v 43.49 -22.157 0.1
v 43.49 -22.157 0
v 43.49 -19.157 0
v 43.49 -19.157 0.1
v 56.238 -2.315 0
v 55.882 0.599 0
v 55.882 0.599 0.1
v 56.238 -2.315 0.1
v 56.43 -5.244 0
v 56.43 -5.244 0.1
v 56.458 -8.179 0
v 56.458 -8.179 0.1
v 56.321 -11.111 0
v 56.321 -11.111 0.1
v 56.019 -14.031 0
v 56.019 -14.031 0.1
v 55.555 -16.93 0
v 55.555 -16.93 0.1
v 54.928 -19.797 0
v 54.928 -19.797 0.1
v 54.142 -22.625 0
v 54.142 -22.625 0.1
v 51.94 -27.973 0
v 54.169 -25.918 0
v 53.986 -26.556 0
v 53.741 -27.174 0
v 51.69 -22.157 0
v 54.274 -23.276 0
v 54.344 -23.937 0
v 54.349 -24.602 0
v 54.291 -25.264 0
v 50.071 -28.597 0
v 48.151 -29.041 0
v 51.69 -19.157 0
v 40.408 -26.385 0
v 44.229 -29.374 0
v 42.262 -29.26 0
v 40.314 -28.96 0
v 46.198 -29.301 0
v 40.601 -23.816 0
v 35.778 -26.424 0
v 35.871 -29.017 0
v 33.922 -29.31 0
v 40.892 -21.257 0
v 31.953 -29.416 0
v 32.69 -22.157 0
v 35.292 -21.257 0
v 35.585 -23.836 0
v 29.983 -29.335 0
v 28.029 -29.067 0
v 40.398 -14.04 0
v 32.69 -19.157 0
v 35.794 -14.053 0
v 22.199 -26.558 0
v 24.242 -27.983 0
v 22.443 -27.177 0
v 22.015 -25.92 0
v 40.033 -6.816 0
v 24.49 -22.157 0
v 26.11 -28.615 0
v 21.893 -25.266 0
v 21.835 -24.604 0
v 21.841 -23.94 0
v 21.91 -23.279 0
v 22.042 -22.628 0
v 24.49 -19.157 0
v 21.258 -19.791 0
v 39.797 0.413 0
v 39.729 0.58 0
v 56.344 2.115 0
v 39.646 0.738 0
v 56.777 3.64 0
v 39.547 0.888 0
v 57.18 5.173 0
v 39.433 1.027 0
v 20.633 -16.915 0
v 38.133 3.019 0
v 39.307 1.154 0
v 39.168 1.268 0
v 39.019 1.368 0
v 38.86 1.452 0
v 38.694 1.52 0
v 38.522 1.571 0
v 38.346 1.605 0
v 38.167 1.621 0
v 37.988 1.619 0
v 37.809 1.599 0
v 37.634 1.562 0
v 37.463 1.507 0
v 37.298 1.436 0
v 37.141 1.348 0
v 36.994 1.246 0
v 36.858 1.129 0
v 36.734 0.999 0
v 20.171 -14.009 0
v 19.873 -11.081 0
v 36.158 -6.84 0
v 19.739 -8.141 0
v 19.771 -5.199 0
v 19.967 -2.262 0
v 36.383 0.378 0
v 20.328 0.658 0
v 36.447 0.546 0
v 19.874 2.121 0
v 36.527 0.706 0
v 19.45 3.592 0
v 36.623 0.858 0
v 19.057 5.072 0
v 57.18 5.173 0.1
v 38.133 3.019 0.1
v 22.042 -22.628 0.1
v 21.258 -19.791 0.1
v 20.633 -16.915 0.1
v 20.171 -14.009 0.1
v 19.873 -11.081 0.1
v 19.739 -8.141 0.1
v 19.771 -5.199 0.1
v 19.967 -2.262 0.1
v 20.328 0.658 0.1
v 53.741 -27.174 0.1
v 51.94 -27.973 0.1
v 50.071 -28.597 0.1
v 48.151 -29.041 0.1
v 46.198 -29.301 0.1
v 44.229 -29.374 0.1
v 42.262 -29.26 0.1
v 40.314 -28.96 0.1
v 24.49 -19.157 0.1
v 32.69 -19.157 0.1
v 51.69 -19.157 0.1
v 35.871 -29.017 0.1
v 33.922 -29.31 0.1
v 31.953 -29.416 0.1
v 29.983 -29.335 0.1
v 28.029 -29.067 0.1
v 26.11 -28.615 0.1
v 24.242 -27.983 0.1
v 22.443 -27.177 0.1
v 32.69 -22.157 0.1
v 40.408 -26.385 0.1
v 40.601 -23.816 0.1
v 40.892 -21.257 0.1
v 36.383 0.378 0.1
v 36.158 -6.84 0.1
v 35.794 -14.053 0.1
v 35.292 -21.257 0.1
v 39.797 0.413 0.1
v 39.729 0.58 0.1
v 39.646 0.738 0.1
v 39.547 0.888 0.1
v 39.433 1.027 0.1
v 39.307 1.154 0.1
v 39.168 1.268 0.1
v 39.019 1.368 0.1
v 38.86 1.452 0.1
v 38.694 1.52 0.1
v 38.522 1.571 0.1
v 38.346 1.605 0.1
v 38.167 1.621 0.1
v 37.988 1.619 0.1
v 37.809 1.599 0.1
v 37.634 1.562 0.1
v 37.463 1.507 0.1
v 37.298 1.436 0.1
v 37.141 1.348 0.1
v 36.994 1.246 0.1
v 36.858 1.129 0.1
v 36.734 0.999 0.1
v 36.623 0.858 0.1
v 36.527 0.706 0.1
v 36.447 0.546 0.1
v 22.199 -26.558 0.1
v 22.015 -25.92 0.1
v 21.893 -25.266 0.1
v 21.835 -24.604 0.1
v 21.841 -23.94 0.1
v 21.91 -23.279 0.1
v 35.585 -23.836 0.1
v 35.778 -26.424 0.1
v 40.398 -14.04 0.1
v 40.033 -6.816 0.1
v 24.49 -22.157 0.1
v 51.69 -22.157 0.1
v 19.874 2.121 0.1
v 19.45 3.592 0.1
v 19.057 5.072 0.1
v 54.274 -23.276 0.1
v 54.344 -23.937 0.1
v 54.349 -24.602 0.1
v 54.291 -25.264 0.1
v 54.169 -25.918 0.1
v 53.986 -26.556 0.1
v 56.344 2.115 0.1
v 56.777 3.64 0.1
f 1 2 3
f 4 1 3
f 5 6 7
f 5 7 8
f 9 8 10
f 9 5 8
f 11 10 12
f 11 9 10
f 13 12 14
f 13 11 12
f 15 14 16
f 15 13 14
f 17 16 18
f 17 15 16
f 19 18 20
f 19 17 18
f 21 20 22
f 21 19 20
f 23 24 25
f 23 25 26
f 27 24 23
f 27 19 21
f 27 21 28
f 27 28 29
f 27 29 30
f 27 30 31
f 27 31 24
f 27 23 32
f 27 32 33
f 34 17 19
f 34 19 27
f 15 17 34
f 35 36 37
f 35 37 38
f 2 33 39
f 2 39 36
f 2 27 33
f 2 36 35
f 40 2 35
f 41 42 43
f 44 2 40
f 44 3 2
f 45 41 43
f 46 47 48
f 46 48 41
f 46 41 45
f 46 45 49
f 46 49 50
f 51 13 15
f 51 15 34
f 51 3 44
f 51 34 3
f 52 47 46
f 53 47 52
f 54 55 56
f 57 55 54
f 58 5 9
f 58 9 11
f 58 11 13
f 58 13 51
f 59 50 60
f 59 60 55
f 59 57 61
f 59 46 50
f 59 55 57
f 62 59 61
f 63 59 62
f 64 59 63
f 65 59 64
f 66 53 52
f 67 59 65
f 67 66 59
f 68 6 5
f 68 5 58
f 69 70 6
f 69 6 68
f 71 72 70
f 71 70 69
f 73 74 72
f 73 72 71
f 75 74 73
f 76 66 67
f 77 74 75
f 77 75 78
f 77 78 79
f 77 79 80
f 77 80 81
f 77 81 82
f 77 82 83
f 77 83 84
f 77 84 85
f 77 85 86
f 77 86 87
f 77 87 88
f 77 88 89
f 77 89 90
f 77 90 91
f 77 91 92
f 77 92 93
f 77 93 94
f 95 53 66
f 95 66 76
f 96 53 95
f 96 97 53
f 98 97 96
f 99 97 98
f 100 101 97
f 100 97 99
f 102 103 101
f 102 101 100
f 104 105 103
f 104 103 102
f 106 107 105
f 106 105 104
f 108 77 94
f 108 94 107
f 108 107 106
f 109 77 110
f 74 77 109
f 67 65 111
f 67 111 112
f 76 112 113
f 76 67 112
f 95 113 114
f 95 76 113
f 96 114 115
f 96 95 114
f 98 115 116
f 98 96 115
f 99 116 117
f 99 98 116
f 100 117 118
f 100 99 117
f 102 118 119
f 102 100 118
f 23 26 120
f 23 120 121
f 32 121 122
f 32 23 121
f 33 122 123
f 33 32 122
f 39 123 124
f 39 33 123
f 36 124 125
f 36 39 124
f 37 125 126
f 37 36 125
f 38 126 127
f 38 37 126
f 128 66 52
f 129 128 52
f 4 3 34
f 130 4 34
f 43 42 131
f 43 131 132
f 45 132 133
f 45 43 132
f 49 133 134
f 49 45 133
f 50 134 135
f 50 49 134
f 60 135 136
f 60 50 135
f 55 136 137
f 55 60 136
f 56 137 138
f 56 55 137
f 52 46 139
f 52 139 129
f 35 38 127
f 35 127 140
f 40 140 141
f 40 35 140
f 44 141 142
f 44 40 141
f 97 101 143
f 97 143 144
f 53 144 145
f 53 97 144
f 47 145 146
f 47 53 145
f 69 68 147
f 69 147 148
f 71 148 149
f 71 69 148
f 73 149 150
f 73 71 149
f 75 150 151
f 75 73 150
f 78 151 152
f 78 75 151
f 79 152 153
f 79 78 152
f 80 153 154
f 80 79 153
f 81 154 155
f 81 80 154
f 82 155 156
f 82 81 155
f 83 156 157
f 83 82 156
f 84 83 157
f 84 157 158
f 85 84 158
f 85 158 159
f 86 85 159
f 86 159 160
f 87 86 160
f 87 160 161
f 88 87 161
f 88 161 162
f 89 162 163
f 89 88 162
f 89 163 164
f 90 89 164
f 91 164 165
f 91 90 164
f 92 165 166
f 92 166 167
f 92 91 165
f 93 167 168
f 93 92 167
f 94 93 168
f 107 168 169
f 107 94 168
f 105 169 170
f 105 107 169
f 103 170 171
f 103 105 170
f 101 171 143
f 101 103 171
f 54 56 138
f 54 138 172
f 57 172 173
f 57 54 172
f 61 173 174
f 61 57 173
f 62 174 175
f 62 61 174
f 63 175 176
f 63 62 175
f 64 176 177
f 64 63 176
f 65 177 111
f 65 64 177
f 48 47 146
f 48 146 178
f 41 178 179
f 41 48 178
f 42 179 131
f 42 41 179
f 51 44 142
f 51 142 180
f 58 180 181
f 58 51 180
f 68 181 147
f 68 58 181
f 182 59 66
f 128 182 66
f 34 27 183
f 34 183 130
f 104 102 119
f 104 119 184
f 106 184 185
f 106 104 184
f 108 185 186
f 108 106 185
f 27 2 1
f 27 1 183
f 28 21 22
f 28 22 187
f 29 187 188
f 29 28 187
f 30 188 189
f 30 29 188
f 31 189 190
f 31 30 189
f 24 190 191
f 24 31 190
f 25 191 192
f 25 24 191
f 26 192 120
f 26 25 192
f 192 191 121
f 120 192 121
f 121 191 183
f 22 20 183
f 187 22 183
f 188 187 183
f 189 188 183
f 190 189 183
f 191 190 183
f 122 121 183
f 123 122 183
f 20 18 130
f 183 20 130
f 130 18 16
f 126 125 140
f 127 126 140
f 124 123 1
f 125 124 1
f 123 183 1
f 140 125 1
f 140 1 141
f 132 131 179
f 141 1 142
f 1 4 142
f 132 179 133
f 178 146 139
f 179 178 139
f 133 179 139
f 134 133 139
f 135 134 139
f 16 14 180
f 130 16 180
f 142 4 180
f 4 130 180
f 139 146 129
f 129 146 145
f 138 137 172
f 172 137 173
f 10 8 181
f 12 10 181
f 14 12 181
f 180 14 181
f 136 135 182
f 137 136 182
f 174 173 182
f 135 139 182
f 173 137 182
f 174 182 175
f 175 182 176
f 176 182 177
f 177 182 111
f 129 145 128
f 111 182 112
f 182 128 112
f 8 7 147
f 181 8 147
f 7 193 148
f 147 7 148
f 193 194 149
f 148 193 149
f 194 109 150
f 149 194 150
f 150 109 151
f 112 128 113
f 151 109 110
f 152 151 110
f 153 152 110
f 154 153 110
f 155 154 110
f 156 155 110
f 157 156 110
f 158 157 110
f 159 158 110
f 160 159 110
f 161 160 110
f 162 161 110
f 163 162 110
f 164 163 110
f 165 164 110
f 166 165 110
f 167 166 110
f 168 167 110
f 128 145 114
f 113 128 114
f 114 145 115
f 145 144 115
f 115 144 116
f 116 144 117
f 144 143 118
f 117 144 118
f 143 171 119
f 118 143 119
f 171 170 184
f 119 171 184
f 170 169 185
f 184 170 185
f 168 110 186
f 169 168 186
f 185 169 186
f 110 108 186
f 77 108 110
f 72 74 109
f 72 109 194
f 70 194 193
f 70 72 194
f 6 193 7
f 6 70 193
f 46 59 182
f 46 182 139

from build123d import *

# Parameters (mm, degrees)
MODEL_W                 = 8.2
MODEL_H                 = 3
SALIENTE_EXTRUIR1_DEPTH = 0.1


with BuildPart() as part:
    # Model → Saliente-Extruir1 (new body)
    with BuildSketch(Plane.XY):
        with BuildLine():
            Line((38.133331438, 3.018818363), (57.179927809, 5.173191598))
            ThreePointArc((57.179927809, 5.173191598), (56.564184394, 2.876430864), (55.882023409, 0.598513786))
            ThreePointArc((55.882023409, 0.598513786), (56.320793695, -11.111458732), (54.141567414, -22.625230857))
            ThreePointArc((54.141567414, -22.625230857), (54.328024919, -24.933799392), (53.741439305, -27.174373514))
            ThreePointArc((53.741439305, -27.174373514), (47.17770756, -29.193874015), (40.314312824, -28.959845377))
            ThreePointArc((40.314312824, -28.959845377), (40.492148067, -25.099981333), (40.891508653, -21.256716194))
            ThreePointArc((40.891508653, -21.256716194), (40.199471936, -10.428965006), (39.796709943, 0.413400668))
            ThreePointArc((39.796709943, 0.413400668), (38.077330395, 1.62185217), (36.383150384, 0.378318835))
            ThreePointArc((36.383150384, 0.378318835), (35.993185815, -10.447336237), (35.292291091, -21.257314345))
            ThreePointArc((35.292291091, -21.257314345), (35.69426102, -25.128822948), (35.871435139, -29.017108947))
            ThreePointArc((35.871435139, -29.017108947), (29.002751827, -29.224427494), (22.443184445, -27.176534138))
            ThreePointArc((22.443184445, -27.176534138), (21.856306031, -24.936090235), (22.042444158, -22.627547891))
            ThreePointArc((22.042444158, -22.627547891), (19.872780358, -11.081256605), (20.328112859, 0.658290054))
            ThreePointArc((20.328112859, 0.658290054), (19.658091011, 2.85533825), (19.057482139, 5.072367576))
            Line((19.057482139, 5.072367576), (38.133331438, 3.018818363))
        make_face()
        with Locations((28.59004178, -20.657297672)):
            Rectangle(MODEL_W, MODEL_H, mode=Mode.SUBTRACT)
        with Locations((47.59004178, -20.657297672)):
            Rectangle(MODEL_W, MODEL_H, mode=Mode.SUBTRACT)
    extrude(amount=SALIENTE_EXTRUIR1_DEPTH)


solid = part.part
